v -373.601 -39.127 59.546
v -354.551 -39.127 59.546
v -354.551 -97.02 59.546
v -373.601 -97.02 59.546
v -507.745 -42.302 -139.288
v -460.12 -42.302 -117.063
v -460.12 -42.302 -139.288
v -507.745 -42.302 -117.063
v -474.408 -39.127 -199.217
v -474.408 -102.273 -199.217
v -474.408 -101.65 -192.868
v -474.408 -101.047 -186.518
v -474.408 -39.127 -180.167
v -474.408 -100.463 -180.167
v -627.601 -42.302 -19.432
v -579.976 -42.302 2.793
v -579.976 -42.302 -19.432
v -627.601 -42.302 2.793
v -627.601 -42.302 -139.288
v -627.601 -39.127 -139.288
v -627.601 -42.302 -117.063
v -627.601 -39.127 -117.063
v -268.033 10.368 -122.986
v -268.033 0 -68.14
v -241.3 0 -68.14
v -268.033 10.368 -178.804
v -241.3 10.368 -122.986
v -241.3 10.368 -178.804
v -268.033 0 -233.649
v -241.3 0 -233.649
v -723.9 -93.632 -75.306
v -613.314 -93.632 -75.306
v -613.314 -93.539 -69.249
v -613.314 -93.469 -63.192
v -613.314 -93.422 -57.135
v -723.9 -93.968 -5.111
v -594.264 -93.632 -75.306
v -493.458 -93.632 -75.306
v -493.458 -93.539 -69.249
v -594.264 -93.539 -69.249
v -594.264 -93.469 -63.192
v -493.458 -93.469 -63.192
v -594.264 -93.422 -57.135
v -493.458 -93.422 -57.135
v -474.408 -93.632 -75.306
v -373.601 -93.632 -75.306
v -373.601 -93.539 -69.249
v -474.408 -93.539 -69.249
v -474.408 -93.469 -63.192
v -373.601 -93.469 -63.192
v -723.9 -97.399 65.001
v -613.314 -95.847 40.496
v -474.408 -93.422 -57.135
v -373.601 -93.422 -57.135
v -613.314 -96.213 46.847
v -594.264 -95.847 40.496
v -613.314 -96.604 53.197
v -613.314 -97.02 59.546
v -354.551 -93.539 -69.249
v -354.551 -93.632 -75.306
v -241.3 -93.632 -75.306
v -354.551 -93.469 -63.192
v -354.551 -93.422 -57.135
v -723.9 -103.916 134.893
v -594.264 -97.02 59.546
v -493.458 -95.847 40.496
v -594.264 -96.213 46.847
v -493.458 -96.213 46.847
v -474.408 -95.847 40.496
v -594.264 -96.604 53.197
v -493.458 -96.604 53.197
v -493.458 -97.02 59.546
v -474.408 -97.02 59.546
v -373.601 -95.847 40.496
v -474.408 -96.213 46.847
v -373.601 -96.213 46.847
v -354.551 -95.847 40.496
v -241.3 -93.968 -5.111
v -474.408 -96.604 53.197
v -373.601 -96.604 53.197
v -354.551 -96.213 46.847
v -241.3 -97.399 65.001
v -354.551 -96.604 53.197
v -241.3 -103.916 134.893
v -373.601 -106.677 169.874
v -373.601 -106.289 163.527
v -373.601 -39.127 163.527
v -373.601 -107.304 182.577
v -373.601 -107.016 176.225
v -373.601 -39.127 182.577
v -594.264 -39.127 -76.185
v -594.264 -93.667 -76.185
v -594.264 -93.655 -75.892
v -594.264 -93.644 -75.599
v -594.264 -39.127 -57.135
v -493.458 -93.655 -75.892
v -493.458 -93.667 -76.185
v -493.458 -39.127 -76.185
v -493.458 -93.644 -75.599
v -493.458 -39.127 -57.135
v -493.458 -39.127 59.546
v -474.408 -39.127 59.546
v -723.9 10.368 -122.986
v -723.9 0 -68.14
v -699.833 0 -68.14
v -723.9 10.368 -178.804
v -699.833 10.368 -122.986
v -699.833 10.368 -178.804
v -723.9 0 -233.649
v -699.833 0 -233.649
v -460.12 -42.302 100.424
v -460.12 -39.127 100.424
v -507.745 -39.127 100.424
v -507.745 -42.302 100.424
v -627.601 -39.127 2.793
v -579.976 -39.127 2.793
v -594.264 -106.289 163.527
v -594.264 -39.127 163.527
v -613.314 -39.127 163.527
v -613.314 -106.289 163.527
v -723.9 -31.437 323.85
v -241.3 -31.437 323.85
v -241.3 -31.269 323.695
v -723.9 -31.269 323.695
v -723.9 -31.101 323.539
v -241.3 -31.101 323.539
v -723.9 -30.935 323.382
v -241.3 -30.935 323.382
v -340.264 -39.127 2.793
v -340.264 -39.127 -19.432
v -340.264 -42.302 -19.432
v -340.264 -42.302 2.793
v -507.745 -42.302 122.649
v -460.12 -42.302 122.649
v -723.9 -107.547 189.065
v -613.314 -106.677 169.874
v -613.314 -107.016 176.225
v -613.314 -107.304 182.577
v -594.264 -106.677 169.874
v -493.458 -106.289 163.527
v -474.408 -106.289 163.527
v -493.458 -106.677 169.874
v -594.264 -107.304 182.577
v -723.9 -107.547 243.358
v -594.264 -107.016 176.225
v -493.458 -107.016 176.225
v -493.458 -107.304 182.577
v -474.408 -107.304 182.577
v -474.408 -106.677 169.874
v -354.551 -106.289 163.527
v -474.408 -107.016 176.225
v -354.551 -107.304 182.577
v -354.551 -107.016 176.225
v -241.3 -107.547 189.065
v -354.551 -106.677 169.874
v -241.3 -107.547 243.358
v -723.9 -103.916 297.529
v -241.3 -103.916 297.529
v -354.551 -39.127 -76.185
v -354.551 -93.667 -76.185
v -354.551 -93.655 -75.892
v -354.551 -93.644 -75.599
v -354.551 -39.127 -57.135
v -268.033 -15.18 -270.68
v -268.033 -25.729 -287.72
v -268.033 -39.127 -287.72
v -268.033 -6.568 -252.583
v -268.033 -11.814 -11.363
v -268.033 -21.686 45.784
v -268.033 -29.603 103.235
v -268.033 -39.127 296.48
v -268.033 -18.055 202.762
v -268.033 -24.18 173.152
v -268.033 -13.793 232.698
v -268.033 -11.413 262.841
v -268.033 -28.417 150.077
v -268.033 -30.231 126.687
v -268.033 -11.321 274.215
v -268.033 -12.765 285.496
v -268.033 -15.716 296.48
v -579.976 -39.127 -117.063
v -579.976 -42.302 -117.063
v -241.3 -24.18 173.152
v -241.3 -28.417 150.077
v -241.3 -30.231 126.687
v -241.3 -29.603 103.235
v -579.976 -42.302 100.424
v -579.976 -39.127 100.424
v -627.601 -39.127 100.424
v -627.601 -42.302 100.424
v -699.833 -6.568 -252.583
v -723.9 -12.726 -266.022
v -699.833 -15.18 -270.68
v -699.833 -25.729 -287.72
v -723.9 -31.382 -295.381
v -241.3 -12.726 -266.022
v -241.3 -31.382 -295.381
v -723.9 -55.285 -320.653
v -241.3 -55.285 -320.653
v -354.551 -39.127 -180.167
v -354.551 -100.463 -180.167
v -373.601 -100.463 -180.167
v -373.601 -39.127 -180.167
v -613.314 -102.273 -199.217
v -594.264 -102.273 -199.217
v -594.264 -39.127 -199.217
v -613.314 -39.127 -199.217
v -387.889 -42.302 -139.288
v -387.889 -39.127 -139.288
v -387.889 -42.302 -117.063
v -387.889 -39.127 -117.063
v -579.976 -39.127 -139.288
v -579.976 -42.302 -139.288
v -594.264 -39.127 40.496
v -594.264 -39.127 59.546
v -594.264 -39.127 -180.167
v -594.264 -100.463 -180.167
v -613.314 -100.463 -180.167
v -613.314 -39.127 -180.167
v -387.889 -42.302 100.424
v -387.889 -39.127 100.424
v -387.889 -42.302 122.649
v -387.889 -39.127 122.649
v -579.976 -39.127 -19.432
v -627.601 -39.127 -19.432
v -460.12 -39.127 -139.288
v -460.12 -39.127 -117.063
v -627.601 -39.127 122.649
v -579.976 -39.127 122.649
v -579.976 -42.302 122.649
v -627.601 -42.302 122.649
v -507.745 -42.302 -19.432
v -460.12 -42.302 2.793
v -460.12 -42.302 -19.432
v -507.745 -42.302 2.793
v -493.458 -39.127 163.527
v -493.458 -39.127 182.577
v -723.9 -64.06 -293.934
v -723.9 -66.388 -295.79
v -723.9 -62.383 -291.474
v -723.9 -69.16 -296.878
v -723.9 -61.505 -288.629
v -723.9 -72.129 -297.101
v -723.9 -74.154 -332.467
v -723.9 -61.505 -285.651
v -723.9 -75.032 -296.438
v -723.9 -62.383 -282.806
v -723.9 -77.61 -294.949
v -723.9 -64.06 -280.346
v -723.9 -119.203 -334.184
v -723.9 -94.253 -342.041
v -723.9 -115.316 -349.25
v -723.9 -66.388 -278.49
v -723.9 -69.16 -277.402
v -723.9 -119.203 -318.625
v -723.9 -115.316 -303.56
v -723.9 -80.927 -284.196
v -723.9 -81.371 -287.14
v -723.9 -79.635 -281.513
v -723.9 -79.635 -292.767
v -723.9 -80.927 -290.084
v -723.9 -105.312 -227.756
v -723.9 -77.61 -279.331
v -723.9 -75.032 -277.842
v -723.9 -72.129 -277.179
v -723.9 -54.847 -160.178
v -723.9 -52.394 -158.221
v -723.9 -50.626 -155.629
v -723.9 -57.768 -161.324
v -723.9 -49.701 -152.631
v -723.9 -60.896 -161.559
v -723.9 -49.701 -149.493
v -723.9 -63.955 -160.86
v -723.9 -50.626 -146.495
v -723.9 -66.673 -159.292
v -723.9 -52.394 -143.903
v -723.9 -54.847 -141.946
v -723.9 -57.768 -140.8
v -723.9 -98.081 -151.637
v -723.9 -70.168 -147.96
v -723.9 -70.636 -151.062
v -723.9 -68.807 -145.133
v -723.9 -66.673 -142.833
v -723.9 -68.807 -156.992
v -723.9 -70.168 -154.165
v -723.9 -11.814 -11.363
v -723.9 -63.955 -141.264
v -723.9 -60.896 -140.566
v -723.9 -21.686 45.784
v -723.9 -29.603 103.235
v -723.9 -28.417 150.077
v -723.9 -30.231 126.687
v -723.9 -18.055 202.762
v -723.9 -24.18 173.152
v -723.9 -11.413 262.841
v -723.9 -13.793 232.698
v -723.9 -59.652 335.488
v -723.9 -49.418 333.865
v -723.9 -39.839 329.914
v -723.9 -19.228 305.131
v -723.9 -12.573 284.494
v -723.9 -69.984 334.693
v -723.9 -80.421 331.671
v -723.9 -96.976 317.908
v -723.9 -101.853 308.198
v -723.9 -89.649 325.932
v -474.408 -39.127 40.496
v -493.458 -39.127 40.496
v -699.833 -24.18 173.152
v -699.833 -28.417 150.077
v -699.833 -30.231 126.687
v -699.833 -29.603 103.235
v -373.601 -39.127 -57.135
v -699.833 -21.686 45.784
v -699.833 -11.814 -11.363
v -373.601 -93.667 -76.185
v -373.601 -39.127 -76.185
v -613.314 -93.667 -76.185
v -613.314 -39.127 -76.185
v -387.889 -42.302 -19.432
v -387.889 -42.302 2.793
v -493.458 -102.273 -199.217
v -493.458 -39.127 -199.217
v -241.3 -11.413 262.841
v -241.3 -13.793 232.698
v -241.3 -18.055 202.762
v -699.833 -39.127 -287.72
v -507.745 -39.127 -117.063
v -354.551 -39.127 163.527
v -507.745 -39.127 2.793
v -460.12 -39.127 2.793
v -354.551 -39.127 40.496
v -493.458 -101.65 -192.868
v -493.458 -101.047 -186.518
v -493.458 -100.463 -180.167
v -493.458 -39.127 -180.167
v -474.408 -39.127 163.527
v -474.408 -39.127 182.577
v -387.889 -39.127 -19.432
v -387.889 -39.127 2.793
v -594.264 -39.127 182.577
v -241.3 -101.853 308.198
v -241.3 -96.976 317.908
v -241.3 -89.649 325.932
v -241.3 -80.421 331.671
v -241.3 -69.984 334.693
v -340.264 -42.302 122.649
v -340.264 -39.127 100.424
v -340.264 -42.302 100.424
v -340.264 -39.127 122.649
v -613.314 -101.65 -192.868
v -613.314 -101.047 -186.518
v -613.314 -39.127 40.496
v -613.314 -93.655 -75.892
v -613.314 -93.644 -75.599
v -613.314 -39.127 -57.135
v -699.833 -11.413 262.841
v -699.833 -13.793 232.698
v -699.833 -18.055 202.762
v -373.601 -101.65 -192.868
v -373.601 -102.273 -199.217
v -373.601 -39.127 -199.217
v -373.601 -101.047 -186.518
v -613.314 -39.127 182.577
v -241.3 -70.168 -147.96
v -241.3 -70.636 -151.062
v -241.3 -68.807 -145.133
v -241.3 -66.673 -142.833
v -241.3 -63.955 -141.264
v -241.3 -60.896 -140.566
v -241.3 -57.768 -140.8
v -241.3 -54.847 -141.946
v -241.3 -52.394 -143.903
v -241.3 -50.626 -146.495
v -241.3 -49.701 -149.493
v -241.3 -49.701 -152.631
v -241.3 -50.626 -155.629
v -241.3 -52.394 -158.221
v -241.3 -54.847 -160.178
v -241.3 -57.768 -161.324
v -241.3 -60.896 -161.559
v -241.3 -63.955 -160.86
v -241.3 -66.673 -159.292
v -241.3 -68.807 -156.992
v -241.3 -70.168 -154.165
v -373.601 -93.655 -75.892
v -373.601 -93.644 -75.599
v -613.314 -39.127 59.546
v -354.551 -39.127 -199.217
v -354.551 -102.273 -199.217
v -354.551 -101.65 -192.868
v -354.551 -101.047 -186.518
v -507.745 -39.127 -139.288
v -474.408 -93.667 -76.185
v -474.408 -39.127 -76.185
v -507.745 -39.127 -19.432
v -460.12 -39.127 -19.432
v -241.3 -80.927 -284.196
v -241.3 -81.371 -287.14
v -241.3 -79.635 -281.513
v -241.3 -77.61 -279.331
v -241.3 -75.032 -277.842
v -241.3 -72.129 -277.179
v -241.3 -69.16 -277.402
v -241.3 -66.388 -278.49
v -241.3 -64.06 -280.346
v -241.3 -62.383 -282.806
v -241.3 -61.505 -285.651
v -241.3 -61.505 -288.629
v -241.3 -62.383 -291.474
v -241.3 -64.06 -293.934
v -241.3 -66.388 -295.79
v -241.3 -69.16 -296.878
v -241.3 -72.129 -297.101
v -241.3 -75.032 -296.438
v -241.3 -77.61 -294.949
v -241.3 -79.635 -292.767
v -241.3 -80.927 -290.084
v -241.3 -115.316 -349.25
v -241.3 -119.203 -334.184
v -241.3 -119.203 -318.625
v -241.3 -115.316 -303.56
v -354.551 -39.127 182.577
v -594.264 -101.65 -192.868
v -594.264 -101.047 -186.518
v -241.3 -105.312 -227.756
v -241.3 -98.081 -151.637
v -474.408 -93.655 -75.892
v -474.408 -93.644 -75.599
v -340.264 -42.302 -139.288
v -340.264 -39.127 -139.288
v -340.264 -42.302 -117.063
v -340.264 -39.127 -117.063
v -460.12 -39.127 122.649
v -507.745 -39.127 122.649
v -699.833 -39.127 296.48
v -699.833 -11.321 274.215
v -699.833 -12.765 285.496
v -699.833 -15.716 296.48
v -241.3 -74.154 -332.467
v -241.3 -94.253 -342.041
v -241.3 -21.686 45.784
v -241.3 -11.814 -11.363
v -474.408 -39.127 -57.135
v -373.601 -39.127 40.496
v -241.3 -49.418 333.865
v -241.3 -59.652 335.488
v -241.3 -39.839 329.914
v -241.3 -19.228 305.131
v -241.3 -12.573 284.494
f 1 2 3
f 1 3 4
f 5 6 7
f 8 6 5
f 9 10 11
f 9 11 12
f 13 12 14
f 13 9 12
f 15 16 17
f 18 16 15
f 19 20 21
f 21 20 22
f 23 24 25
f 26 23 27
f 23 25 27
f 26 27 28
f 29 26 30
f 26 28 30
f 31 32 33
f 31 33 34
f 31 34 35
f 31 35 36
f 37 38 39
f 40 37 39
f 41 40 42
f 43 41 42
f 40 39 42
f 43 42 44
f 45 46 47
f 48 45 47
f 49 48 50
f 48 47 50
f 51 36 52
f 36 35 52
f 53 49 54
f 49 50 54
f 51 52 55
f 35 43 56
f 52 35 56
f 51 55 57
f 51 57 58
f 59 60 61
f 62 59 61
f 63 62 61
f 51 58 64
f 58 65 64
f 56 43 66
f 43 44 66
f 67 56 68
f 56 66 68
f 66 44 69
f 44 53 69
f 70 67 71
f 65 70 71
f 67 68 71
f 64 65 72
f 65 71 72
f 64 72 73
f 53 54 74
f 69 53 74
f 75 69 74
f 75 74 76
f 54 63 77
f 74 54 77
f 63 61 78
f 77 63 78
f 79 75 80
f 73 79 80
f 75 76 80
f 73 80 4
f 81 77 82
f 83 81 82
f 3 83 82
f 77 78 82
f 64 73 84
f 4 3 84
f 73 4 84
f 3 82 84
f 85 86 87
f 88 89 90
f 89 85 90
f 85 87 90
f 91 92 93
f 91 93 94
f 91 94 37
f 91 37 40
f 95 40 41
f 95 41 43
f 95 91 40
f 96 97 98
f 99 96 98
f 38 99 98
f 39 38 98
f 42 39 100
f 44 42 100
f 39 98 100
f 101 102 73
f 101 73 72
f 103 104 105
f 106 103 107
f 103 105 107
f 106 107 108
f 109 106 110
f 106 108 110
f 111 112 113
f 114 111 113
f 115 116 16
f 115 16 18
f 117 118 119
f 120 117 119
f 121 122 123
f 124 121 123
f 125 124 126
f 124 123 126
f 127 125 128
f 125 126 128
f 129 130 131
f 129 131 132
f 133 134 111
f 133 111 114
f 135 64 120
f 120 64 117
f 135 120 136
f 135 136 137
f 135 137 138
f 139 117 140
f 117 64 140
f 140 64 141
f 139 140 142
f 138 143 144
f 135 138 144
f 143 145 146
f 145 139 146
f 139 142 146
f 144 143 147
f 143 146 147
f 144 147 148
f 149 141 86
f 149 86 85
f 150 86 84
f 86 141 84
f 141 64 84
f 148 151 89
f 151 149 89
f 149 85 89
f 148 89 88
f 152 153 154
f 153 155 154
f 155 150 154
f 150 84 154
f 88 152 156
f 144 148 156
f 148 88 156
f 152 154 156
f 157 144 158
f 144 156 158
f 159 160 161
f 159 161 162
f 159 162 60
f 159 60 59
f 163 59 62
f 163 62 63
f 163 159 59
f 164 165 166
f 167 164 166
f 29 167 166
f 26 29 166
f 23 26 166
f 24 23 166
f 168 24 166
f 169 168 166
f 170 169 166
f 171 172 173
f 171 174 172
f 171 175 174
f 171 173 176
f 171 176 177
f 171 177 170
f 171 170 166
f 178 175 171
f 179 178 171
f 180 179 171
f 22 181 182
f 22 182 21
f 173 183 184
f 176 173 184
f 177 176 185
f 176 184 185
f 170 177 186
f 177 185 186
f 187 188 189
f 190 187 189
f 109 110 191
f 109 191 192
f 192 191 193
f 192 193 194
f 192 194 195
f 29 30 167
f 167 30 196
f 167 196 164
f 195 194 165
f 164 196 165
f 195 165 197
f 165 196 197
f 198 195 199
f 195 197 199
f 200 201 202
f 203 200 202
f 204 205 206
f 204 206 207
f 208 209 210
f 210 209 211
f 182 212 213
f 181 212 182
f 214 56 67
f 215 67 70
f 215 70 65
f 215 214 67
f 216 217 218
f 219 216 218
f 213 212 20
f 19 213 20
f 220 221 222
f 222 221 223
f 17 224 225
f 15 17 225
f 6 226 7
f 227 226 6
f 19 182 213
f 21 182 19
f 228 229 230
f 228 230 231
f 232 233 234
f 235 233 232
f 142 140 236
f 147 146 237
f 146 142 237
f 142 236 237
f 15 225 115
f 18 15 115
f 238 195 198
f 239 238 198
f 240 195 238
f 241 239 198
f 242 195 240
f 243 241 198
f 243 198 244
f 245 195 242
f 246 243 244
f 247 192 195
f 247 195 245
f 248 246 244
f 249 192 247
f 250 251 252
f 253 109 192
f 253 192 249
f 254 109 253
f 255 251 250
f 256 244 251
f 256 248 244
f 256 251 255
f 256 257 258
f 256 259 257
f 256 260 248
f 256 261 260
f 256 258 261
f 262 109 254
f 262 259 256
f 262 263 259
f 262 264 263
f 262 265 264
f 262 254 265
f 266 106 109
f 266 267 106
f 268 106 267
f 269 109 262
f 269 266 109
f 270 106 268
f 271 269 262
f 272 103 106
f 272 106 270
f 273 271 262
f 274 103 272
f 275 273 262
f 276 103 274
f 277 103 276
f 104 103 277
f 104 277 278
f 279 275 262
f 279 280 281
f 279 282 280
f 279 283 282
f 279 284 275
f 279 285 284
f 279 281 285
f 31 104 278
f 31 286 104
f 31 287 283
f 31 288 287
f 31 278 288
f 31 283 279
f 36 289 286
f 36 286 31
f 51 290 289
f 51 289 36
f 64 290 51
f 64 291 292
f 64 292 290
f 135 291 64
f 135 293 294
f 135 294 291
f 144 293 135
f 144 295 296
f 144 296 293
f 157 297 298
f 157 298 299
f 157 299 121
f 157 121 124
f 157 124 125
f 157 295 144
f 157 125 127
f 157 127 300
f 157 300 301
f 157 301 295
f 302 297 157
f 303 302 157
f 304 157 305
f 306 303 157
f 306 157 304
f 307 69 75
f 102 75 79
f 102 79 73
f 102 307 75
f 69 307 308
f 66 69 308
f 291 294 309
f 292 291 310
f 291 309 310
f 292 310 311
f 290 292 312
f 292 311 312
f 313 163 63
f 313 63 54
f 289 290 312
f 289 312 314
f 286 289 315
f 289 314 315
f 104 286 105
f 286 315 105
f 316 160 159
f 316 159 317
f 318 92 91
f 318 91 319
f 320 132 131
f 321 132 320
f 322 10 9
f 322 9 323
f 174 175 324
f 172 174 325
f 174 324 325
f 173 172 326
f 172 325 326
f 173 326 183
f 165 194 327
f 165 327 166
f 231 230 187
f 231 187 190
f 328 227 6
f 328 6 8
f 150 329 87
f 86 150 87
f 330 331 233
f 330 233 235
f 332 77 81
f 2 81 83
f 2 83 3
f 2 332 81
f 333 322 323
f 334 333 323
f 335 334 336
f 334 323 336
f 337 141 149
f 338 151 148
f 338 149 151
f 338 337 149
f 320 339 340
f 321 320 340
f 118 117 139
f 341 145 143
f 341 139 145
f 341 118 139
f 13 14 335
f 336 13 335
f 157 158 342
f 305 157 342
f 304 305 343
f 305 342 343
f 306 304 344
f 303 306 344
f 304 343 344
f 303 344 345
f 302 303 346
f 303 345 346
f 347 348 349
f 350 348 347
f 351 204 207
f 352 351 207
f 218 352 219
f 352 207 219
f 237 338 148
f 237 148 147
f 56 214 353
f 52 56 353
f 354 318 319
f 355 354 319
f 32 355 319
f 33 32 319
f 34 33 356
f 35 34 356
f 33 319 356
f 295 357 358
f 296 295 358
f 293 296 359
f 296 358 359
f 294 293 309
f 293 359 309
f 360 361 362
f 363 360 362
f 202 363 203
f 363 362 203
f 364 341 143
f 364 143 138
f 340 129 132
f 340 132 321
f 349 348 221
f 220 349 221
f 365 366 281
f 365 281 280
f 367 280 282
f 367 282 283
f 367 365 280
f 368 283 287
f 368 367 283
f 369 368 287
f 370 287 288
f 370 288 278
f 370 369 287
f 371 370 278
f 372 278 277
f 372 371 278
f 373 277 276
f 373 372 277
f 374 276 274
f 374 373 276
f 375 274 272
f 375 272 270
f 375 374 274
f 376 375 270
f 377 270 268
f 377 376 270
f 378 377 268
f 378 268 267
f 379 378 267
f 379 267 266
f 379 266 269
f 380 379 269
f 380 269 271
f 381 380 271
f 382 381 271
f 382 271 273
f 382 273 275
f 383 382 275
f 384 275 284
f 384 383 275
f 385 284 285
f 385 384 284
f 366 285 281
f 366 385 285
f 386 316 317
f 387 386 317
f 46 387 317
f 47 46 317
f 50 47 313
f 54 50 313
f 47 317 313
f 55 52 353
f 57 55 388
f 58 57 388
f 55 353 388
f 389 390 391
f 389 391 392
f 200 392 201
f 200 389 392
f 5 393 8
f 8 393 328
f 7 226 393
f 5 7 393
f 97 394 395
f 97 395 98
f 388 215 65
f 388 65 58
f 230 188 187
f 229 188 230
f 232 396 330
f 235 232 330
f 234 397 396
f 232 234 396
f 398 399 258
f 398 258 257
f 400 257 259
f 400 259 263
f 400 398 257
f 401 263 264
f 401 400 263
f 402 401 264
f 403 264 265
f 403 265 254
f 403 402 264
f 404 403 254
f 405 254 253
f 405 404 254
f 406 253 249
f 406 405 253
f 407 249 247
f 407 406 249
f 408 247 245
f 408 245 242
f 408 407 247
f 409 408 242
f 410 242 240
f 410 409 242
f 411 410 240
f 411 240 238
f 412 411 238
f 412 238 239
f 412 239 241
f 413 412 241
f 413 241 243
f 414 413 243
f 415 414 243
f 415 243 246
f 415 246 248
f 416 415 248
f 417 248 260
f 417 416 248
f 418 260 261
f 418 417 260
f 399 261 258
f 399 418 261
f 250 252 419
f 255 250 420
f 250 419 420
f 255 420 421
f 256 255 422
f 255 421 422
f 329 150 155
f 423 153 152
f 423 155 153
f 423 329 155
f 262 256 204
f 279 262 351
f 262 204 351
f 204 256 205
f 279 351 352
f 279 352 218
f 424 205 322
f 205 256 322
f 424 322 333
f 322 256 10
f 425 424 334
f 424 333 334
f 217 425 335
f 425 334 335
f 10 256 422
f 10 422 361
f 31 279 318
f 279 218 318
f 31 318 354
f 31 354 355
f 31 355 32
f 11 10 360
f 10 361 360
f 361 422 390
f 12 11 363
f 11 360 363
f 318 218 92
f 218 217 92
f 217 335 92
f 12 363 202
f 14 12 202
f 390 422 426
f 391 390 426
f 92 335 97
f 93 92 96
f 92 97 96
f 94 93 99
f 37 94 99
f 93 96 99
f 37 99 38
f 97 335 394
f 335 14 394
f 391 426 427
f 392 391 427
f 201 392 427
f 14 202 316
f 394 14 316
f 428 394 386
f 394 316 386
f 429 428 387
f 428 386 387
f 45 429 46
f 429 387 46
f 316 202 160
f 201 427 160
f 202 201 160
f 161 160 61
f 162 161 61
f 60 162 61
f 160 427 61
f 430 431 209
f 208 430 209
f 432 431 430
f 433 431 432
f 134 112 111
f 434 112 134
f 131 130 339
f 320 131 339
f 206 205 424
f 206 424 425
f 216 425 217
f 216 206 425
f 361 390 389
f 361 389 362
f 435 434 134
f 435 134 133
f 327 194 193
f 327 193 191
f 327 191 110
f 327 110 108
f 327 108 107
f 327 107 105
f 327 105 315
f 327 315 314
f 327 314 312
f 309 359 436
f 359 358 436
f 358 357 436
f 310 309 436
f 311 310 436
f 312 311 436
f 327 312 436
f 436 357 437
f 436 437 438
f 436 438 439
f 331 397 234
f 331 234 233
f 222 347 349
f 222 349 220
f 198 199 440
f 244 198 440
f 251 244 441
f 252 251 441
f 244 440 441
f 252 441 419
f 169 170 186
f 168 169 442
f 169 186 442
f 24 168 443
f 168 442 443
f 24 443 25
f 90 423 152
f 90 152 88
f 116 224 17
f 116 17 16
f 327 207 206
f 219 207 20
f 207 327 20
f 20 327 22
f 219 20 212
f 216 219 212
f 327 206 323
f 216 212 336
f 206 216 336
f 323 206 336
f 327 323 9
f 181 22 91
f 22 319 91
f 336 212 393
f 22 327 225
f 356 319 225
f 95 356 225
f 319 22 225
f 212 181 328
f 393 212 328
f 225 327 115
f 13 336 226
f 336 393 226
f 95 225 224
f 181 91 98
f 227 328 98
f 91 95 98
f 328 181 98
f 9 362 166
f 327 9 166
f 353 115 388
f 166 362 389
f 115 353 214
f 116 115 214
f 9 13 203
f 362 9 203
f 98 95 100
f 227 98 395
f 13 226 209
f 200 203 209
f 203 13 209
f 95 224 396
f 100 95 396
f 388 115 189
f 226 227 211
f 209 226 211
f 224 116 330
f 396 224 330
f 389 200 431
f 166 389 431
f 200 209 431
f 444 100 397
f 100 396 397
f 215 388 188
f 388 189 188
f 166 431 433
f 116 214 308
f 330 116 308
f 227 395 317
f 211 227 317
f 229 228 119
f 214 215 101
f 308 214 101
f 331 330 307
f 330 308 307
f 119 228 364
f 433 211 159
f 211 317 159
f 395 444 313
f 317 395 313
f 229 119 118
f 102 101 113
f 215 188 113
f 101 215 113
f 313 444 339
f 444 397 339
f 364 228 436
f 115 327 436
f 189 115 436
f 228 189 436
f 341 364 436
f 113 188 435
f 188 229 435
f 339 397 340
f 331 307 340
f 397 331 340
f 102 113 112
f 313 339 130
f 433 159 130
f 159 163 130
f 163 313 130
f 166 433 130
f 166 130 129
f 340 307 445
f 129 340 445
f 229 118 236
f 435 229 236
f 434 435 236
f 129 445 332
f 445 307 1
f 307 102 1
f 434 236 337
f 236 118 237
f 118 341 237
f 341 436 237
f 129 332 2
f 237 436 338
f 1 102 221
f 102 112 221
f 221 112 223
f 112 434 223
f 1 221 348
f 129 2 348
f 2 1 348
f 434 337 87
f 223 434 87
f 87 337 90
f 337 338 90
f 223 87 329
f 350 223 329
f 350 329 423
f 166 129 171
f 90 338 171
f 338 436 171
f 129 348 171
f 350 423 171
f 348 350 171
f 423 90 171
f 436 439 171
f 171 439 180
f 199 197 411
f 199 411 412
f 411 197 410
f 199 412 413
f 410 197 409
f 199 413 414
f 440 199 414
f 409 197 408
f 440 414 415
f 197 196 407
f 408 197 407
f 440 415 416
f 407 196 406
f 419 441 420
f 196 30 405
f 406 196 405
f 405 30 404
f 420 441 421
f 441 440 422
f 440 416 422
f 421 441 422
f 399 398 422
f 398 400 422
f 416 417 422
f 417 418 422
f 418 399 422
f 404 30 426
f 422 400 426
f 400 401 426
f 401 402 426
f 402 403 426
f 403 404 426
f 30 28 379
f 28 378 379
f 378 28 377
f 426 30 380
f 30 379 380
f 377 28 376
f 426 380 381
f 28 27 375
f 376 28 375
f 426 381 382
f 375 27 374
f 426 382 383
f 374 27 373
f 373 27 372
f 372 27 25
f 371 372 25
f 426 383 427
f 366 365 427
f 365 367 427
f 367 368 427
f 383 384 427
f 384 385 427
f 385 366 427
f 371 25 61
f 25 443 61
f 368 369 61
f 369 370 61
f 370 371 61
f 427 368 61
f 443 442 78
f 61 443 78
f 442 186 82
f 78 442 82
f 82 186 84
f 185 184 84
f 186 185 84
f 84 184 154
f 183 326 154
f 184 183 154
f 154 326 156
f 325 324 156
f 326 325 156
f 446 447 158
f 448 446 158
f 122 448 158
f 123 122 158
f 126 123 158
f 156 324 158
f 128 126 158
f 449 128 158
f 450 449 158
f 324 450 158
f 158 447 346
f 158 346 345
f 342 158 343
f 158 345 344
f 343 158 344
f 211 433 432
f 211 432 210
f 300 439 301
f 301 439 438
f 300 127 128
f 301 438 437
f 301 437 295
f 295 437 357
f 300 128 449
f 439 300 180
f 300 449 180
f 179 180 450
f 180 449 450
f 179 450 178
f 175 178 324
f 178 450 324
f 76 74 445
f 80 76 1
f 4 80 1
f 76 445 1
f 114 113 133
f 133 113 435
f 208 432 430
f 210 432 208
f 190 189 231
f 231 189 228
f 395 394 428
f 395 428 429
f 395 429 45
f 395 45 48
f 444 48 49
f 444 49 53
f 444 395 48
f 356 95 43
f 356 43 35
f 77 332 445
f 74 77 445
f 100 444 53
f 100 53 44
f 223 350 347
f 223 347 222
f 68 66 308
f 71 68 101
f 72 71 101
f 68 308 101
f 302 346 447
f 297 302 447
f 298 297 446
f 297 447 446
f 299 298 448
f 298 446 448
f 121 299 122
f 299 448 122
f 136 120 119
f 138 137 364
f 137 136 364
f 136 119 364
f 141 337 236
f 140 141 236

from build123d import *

# Parameters (mm, degrees)
F1_DEPTH  = 120.65
F2_R      = 9.9885996102
F2_R_2    = 10.5258660688
F3_DEPTH  = 482.6
F4_W      = 344.8911011219
F4_H      = 764.6993398666
F4_W_2    = 120.65
F4_H_2    = 673.1
F5_DEPTH  = 482.6
F8_W      = 431.8
F8_H      = 584.2
F9_DEPTH  = 50.8
F10_W     = 19.05
F10_H     = 19.05
F11_DEPTH = 95.25
F10_W_2   = 47.625
F10_H_2   = 22.225
F12_DEPTH = 3.175


with BuildPart() as f1:
    # F0 (on Front) → F1 (new body)
    with BuildSketch(Plane.XZ):
        with BuildLine():
            Line((-241.3, 323.85), (-241.3, -349.25))
            Line((-241.3, -349.25), (241.3, -349.25))
            Line((241.3, -349.25), (241.3, 323.85))
            ThreePointArc((241.3, 323.85), (0, 349.25), (-241.3, 323.85))
        make_face()
    extrude(amount=F1_DEPTH)

    # F4 (on face) → F5 (cut)
    with BuildSketch(Plane.YZ.offset(241.3)):
        with Locations((-53.2562285662, 11.3563537598)):
            Rectangle(F4_W, F4_H)
        with Locations((-60.325, -12.7)):
            Rectangle(F4_W_2, F4_H_2, mode=Mode.SUBTRACT)
        with Locations((-60.325, -12.7)):
            Rectangle(F4_W_2, F4_H_2)
    extrude(amount=-F5_DEPTH, mode=Mode.SUBTRACT)


with BuildPart() as f3:
    # F2 (on face) → F3 (new body)
    with BuildSketch(Plane(origin=(-241.3, 0, 0), x_dir=(0, -1, 0), z_dir=(-1, 0, 0))):
        with BuildLine():
            Line((0, -68.1404843926), (0, -233.649328351))
            ThreePointArc((0, -233.649328351), (21.350852379, -281.1488587038), (55.2847087383, -320.6527531147))
            ThreePointArc((55.2847087383, -320.6527531147), (84.0658754315, -337.5428209275), (115.3160259128, -349.25))
            ThreePointArc((115.3160259128, -349.25), (119.6951401667, -326.4048751593), (115.3160259128, -303.5597503185))
            ThreePointArc((115.3160259128, -303.5597503185), (101.3495716057, -189.7295194826), (93.6318859458, -75.3056555986))
            ThreePointArc((93.6318859458, -75.3056555986), (95.2968862194, 29.9638674769), (103.9162650704, 134.8931342363))
            ThreePointArc((103.9162650704, 134.8931342363), (108.0016932489, 216.2111774087), (103.9162650704, 297.5292205811))
            ThreePointArc((103.9162650704, 297.5292205811), (100.4192959768, 311.8158756468), (91.9625142686, 323.85))
            Line((91.9625142686, 323.85), (31.436908019, 323.85))
            ThreePointArc((31.436908019, 323.85), (31.1849940922, 323.6171736523), (30.9348870069, 323.3824074268))
            ThreePointArc((30.9348870069, 323.3824074268), (15.2328502157, 295.0276660156), (11.4129362628, 262.8414332867))
            ThreePointArc((11.4129362628, 262.8414332867), (15.6896829727, 217.6965972865), (24.1801738739, 173.1515824795))
            ThreePointArc((24.1801738739, 173.1515824795), (29.6284254011, 138.4055637112), (29.6032354236, 103.2349988818))
            ThreePointArc((29.6032354236, 103.2349988818), (16.9934129505, 17.1686486524), (0, -68.1404843926))
        make_face()
        with Locations((71.3824555278, -287.1399223804)):
            Circle(F2_R, mode=Mode.SUBTRACT)
        with Locations((60.1097382605, -151.0620862246)):
            Circle(F2_R_2, mode=Mode.SUBTRACT)
        with BuildLine():
            ThreePointArc((69.983959198, 334.6931636333), (49.4182050819, 333.8654070908), (31.436908019, 323.85))
            Line((31.436908019, 323.85), (91.9625142686, 323.85))
            ThreePointArc((91.9625142686, 323.85), (81.8305714463, 331.0093567724), (69.983959198, 334.6931636333))
        make_face()
        with BuildLine():
            ThreePointArc((0, -68.1404843926), (-11.673043687, -150.8949063718), (0, -233.649328351))
            Line((0, -233.649328351), (0, -68.1404843926))
        make_face()
    extrude(amount=F3_DEPTH)

    # F8 (on plane+point) → F9 (cut)
    with BuildSketch(Plane.XZ.offset(-11.673043687)):
        with Locations((-483.9325845242, 4.38026824)):
            Rectangle(F8_W, F8_H)
    extrude(amount=F9_DEPTH, mode=Mode.SUBTRACT)

    # F10 (on face) → F11 (cut)
    with BuildSketch(Plane(origin=(0, -39.126956313, 0), x_dir=(-1, 0, 0), z_dir=(0, 1, 0))):
        with Locations((364.0763345242, 173.05214324)):
            Rectangle(F10_W, F10_H)
        with Locations((483.9325845242, 173.05214324)):
            Rectangle(F10_W, F10_H)
        with Locations((603.7888345242, 173.05214324)):
            Rectangle(F10_W, F10_H)
        with Locations((364.0763345242, 50.02089324)):
            Rectangle(F10_W, F10_H)
        with Locations((483.9325845242, 50.02089324)):
            Rectangle(F10_W, F10_H)
        with Locations((603.7888345242, 50.02089324)):
            Rectangle(F10_W, F10_H)
        with Locations((603.7888345242, -66.66035676)):
            Rectangle(F10_W, F10_H)
        with Locations((483.9325845242, -66.66035676)):
            Rectangle(F10_W, F10_H)
        with Locations((364.0763345242, -66.66035676)):
            Rectangle(F10_W, F10_H)
        with Locations((364.0763345242, -189.69160676)):
            Rectangle(F10_W, F10_H)
        with Locations((483.9325845242, -189.69160676)):
            Rectangle(F10_W, F10_H)
        with Locations((603.7888345242, -189.69160676)):
            Rectangle(F10_W, F10_H)
    extrude(amount=-F11_DEPTH, mode=Mode.SUBTRACT)

    # F10 (on face) → F12 (cut)
    with BuildSketch(Plane(origin=(0, -39.126956313, 0), x_dir=(-1, 0, 0), z_dir=(0, 1, 0))):
        with Locations((364.0763345242, 111.53651824)):
            Rectangle(F10_W_2, F10_H_2)
        with Locations((483.9325845242, 111.53651824)):
            Rectangle(F10_W_2, F10_H_2)
        with Locations((603.7888345242, 111.53651824)):
            Rectangle(F10_W_2, F10_H_2)
        with Locations((364.0763345242, -8.31973176)):
            Rectangle(F10_W_2, F10_H_2)
        with Locations((483.9325845242, -8.31973176)):
            Rectangle(F10_W_2, F10_H_2)
        with Locations((603.7888345242, -8.31973176)):
            Rectangle(F10_W_2, F10_H_2)
        with Locations((603.7888345242, -128.17598176)):
            Rectangle(F10_W_2, F10_H_2)
        with Locations((483.9325845242, -128.17598176)):
            Rectangle(F10_W_2, F10_H_2)
        with Locations((364.0763345242, -128.17598176)):
            Rectangle(F10_W_2, F10_H_2)
    extrude(amount=-F12_DEPTH, mode=Mode.SUBTRACT)


solid = f3.part
